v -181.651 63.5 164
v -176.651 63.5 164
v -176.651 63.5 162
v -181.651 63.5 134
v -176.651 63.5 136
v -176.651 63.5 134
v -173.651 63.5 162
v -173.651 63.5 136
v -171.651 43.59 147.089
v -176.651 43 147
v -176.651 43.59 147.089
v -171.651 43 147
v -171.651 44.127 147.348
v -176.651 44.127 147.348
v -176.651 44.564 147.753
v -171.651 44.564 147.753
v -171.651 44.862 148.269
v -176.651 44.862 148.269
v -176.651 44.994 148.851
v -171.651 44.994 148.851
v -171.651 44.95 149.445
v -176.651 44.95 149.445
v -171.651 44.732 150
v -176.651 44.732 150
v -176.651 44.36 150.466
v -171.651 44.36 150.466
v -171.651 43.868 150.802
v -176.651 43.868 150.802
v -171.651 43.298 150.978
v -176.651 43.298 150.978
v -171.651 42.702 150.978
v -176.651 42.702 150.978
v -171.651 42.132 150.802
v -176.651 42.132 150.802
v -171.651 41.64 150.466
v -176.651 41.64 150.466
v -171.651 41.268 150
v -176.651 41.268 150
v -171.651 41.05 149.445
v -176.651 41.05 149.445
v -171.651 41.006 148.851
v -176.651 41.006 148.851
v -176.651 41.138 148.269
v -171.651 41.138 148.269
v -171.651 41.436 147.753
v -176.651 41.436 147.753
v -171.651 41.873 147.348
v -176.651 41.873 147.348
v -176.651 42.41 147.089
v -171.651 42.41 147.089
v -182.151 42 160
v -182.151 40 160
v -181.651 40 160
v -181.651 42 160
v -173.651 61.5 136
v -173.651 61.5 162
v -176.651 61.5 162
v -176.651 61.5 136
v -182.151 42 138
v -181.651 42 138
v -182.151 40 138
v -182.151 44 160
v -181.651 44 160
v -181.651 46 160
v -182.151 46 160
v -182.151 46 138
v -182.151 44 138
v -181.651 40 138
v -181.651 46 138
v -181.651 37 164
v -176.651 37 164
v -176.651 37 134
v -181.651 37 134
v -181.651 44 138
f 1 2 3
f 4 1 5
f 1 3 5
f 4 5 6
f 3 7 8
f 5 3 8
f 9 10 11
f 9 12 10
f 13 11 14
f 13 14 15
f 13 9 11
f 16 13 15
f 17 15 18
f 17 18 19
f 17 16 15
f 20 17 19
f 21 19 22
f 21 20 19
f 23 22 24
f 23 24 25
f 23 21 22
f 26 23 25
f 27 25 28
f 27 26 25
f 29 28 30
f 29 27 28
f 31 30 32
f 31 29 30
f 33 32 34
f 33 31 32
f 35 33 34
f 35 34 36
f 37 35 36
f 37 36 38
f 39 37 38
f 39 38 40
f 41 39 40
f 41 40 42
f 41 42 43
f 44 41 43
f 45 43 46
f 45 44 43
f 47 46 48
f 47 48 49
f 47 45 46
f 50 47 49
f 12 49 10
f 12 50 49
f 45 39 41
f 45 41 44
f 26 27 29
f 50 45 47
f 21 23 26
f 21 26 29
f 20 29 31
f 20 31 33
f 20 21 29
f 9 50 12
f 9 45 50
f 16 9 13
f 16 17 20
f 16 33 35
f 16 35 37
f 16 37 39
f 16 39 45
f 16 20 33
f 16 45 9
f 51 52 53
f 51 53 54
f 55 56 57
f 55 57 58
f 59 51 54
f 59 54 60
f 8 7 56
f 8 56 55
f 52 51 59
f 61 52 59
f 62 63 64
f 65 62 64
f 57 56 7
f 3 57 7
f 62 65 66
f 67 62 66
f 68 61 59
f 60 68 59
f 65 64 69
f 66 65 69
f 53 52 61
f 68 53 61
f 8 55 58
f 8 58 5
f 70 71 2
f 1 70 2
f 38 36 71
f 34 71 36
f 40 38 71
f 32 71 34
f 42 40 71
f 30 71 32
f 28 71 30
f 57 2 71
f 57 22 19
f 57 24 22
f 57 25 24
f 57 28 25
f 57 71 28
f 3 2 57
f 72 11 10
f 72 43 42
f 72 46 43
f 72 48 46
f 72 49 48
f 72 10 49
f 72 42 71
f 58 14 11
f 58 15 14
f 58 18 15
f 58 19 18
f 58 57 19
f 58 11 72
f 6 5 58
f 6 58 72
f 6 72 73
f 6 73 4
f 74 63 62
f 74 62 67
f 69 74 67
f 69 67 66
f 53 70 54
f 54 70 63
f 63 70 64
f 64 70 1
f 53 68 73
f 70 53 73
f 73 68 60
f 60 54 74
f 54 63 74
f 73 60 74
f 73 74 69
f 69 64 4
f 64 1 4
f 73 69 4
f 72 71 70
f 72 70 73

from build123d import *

# Parameters (mm, degrees)
SKETCH1_W           = 30
SKETCH1_H           = 26.5
BOSS_EXTRUDE1_DEPTH = 2.5
SKETCH2_W           = 22
SKETCH2_H           = 2
BOSS_EXTRUDE2_DEPTH = 0.5
SKETCH3_W           = 26
SKETCH3_H           = 2
BOSS_EXTRUDE3_DEPTH = 1.5
SKETCH4_R           = 2
BOSS_EXTRUDE4_DEPTH = 2.5


with BuildPart() as part:
    # Sketch1 → Boss-Extrude1 (new, symmetric)
    with BuildSketch(Plane(origin=(-179.150792305, 0, 0), x_dir=(0, 0, -1), z_dir=(1, 0, 0))):
        with Locations((-149, 50.25)):
            Rectangle(SKETCH1_W, SKETCH1_H)
    extrude(amount=BOSS_EXTRUDE1_DEPTH, both=True)

    # Sketch2 → Boss-Extrude2 (add, symmetric)
    with BuildSketch(Plane(origin=(-181.650792305, 0, 0), x_dir=(0, 0, -1), z_dir=(1, 0, 0))):
        with Locations((-149, 41)):
            Rectangle(SKETCH2_W, SKETCH2_H)
        with Locations((-149, 45)):
            Rectangle(SKETCH2_W, SKETCH2_H)
    extrude(amount=BOSS_EXTRUDE2_DEPTH, both=True)

    # Sketch3 → Boss-Extrude3 (add, symmetric)
    with BuildSketch(Plane(origin=(-175.150792305, 0, 0), x_dir=(0, 0, -1), z_dir=(1, 0, 0))):
        with Locations((-149, 62.5)):
            Rectangle(SKETCH3_W, SKETCH3_H)
    extrude(amount=BOSS_EXTRUDE3_DEPTH, both=True)

    # Sketch4 → Boss-Extrude4 (add, symmetric)
    with BuildSketch(Plane(origin=(-174.150792305, 0, 0), x_dir=(0, 0, -1), z_dir=(1, 0, 0))):
        with Locations((-149, 43)):
            Circle(SKETCH4_R)
    extrude(amount=BOSS_EXTRUDE4_DEPTH, both=True)


solid = part.part
